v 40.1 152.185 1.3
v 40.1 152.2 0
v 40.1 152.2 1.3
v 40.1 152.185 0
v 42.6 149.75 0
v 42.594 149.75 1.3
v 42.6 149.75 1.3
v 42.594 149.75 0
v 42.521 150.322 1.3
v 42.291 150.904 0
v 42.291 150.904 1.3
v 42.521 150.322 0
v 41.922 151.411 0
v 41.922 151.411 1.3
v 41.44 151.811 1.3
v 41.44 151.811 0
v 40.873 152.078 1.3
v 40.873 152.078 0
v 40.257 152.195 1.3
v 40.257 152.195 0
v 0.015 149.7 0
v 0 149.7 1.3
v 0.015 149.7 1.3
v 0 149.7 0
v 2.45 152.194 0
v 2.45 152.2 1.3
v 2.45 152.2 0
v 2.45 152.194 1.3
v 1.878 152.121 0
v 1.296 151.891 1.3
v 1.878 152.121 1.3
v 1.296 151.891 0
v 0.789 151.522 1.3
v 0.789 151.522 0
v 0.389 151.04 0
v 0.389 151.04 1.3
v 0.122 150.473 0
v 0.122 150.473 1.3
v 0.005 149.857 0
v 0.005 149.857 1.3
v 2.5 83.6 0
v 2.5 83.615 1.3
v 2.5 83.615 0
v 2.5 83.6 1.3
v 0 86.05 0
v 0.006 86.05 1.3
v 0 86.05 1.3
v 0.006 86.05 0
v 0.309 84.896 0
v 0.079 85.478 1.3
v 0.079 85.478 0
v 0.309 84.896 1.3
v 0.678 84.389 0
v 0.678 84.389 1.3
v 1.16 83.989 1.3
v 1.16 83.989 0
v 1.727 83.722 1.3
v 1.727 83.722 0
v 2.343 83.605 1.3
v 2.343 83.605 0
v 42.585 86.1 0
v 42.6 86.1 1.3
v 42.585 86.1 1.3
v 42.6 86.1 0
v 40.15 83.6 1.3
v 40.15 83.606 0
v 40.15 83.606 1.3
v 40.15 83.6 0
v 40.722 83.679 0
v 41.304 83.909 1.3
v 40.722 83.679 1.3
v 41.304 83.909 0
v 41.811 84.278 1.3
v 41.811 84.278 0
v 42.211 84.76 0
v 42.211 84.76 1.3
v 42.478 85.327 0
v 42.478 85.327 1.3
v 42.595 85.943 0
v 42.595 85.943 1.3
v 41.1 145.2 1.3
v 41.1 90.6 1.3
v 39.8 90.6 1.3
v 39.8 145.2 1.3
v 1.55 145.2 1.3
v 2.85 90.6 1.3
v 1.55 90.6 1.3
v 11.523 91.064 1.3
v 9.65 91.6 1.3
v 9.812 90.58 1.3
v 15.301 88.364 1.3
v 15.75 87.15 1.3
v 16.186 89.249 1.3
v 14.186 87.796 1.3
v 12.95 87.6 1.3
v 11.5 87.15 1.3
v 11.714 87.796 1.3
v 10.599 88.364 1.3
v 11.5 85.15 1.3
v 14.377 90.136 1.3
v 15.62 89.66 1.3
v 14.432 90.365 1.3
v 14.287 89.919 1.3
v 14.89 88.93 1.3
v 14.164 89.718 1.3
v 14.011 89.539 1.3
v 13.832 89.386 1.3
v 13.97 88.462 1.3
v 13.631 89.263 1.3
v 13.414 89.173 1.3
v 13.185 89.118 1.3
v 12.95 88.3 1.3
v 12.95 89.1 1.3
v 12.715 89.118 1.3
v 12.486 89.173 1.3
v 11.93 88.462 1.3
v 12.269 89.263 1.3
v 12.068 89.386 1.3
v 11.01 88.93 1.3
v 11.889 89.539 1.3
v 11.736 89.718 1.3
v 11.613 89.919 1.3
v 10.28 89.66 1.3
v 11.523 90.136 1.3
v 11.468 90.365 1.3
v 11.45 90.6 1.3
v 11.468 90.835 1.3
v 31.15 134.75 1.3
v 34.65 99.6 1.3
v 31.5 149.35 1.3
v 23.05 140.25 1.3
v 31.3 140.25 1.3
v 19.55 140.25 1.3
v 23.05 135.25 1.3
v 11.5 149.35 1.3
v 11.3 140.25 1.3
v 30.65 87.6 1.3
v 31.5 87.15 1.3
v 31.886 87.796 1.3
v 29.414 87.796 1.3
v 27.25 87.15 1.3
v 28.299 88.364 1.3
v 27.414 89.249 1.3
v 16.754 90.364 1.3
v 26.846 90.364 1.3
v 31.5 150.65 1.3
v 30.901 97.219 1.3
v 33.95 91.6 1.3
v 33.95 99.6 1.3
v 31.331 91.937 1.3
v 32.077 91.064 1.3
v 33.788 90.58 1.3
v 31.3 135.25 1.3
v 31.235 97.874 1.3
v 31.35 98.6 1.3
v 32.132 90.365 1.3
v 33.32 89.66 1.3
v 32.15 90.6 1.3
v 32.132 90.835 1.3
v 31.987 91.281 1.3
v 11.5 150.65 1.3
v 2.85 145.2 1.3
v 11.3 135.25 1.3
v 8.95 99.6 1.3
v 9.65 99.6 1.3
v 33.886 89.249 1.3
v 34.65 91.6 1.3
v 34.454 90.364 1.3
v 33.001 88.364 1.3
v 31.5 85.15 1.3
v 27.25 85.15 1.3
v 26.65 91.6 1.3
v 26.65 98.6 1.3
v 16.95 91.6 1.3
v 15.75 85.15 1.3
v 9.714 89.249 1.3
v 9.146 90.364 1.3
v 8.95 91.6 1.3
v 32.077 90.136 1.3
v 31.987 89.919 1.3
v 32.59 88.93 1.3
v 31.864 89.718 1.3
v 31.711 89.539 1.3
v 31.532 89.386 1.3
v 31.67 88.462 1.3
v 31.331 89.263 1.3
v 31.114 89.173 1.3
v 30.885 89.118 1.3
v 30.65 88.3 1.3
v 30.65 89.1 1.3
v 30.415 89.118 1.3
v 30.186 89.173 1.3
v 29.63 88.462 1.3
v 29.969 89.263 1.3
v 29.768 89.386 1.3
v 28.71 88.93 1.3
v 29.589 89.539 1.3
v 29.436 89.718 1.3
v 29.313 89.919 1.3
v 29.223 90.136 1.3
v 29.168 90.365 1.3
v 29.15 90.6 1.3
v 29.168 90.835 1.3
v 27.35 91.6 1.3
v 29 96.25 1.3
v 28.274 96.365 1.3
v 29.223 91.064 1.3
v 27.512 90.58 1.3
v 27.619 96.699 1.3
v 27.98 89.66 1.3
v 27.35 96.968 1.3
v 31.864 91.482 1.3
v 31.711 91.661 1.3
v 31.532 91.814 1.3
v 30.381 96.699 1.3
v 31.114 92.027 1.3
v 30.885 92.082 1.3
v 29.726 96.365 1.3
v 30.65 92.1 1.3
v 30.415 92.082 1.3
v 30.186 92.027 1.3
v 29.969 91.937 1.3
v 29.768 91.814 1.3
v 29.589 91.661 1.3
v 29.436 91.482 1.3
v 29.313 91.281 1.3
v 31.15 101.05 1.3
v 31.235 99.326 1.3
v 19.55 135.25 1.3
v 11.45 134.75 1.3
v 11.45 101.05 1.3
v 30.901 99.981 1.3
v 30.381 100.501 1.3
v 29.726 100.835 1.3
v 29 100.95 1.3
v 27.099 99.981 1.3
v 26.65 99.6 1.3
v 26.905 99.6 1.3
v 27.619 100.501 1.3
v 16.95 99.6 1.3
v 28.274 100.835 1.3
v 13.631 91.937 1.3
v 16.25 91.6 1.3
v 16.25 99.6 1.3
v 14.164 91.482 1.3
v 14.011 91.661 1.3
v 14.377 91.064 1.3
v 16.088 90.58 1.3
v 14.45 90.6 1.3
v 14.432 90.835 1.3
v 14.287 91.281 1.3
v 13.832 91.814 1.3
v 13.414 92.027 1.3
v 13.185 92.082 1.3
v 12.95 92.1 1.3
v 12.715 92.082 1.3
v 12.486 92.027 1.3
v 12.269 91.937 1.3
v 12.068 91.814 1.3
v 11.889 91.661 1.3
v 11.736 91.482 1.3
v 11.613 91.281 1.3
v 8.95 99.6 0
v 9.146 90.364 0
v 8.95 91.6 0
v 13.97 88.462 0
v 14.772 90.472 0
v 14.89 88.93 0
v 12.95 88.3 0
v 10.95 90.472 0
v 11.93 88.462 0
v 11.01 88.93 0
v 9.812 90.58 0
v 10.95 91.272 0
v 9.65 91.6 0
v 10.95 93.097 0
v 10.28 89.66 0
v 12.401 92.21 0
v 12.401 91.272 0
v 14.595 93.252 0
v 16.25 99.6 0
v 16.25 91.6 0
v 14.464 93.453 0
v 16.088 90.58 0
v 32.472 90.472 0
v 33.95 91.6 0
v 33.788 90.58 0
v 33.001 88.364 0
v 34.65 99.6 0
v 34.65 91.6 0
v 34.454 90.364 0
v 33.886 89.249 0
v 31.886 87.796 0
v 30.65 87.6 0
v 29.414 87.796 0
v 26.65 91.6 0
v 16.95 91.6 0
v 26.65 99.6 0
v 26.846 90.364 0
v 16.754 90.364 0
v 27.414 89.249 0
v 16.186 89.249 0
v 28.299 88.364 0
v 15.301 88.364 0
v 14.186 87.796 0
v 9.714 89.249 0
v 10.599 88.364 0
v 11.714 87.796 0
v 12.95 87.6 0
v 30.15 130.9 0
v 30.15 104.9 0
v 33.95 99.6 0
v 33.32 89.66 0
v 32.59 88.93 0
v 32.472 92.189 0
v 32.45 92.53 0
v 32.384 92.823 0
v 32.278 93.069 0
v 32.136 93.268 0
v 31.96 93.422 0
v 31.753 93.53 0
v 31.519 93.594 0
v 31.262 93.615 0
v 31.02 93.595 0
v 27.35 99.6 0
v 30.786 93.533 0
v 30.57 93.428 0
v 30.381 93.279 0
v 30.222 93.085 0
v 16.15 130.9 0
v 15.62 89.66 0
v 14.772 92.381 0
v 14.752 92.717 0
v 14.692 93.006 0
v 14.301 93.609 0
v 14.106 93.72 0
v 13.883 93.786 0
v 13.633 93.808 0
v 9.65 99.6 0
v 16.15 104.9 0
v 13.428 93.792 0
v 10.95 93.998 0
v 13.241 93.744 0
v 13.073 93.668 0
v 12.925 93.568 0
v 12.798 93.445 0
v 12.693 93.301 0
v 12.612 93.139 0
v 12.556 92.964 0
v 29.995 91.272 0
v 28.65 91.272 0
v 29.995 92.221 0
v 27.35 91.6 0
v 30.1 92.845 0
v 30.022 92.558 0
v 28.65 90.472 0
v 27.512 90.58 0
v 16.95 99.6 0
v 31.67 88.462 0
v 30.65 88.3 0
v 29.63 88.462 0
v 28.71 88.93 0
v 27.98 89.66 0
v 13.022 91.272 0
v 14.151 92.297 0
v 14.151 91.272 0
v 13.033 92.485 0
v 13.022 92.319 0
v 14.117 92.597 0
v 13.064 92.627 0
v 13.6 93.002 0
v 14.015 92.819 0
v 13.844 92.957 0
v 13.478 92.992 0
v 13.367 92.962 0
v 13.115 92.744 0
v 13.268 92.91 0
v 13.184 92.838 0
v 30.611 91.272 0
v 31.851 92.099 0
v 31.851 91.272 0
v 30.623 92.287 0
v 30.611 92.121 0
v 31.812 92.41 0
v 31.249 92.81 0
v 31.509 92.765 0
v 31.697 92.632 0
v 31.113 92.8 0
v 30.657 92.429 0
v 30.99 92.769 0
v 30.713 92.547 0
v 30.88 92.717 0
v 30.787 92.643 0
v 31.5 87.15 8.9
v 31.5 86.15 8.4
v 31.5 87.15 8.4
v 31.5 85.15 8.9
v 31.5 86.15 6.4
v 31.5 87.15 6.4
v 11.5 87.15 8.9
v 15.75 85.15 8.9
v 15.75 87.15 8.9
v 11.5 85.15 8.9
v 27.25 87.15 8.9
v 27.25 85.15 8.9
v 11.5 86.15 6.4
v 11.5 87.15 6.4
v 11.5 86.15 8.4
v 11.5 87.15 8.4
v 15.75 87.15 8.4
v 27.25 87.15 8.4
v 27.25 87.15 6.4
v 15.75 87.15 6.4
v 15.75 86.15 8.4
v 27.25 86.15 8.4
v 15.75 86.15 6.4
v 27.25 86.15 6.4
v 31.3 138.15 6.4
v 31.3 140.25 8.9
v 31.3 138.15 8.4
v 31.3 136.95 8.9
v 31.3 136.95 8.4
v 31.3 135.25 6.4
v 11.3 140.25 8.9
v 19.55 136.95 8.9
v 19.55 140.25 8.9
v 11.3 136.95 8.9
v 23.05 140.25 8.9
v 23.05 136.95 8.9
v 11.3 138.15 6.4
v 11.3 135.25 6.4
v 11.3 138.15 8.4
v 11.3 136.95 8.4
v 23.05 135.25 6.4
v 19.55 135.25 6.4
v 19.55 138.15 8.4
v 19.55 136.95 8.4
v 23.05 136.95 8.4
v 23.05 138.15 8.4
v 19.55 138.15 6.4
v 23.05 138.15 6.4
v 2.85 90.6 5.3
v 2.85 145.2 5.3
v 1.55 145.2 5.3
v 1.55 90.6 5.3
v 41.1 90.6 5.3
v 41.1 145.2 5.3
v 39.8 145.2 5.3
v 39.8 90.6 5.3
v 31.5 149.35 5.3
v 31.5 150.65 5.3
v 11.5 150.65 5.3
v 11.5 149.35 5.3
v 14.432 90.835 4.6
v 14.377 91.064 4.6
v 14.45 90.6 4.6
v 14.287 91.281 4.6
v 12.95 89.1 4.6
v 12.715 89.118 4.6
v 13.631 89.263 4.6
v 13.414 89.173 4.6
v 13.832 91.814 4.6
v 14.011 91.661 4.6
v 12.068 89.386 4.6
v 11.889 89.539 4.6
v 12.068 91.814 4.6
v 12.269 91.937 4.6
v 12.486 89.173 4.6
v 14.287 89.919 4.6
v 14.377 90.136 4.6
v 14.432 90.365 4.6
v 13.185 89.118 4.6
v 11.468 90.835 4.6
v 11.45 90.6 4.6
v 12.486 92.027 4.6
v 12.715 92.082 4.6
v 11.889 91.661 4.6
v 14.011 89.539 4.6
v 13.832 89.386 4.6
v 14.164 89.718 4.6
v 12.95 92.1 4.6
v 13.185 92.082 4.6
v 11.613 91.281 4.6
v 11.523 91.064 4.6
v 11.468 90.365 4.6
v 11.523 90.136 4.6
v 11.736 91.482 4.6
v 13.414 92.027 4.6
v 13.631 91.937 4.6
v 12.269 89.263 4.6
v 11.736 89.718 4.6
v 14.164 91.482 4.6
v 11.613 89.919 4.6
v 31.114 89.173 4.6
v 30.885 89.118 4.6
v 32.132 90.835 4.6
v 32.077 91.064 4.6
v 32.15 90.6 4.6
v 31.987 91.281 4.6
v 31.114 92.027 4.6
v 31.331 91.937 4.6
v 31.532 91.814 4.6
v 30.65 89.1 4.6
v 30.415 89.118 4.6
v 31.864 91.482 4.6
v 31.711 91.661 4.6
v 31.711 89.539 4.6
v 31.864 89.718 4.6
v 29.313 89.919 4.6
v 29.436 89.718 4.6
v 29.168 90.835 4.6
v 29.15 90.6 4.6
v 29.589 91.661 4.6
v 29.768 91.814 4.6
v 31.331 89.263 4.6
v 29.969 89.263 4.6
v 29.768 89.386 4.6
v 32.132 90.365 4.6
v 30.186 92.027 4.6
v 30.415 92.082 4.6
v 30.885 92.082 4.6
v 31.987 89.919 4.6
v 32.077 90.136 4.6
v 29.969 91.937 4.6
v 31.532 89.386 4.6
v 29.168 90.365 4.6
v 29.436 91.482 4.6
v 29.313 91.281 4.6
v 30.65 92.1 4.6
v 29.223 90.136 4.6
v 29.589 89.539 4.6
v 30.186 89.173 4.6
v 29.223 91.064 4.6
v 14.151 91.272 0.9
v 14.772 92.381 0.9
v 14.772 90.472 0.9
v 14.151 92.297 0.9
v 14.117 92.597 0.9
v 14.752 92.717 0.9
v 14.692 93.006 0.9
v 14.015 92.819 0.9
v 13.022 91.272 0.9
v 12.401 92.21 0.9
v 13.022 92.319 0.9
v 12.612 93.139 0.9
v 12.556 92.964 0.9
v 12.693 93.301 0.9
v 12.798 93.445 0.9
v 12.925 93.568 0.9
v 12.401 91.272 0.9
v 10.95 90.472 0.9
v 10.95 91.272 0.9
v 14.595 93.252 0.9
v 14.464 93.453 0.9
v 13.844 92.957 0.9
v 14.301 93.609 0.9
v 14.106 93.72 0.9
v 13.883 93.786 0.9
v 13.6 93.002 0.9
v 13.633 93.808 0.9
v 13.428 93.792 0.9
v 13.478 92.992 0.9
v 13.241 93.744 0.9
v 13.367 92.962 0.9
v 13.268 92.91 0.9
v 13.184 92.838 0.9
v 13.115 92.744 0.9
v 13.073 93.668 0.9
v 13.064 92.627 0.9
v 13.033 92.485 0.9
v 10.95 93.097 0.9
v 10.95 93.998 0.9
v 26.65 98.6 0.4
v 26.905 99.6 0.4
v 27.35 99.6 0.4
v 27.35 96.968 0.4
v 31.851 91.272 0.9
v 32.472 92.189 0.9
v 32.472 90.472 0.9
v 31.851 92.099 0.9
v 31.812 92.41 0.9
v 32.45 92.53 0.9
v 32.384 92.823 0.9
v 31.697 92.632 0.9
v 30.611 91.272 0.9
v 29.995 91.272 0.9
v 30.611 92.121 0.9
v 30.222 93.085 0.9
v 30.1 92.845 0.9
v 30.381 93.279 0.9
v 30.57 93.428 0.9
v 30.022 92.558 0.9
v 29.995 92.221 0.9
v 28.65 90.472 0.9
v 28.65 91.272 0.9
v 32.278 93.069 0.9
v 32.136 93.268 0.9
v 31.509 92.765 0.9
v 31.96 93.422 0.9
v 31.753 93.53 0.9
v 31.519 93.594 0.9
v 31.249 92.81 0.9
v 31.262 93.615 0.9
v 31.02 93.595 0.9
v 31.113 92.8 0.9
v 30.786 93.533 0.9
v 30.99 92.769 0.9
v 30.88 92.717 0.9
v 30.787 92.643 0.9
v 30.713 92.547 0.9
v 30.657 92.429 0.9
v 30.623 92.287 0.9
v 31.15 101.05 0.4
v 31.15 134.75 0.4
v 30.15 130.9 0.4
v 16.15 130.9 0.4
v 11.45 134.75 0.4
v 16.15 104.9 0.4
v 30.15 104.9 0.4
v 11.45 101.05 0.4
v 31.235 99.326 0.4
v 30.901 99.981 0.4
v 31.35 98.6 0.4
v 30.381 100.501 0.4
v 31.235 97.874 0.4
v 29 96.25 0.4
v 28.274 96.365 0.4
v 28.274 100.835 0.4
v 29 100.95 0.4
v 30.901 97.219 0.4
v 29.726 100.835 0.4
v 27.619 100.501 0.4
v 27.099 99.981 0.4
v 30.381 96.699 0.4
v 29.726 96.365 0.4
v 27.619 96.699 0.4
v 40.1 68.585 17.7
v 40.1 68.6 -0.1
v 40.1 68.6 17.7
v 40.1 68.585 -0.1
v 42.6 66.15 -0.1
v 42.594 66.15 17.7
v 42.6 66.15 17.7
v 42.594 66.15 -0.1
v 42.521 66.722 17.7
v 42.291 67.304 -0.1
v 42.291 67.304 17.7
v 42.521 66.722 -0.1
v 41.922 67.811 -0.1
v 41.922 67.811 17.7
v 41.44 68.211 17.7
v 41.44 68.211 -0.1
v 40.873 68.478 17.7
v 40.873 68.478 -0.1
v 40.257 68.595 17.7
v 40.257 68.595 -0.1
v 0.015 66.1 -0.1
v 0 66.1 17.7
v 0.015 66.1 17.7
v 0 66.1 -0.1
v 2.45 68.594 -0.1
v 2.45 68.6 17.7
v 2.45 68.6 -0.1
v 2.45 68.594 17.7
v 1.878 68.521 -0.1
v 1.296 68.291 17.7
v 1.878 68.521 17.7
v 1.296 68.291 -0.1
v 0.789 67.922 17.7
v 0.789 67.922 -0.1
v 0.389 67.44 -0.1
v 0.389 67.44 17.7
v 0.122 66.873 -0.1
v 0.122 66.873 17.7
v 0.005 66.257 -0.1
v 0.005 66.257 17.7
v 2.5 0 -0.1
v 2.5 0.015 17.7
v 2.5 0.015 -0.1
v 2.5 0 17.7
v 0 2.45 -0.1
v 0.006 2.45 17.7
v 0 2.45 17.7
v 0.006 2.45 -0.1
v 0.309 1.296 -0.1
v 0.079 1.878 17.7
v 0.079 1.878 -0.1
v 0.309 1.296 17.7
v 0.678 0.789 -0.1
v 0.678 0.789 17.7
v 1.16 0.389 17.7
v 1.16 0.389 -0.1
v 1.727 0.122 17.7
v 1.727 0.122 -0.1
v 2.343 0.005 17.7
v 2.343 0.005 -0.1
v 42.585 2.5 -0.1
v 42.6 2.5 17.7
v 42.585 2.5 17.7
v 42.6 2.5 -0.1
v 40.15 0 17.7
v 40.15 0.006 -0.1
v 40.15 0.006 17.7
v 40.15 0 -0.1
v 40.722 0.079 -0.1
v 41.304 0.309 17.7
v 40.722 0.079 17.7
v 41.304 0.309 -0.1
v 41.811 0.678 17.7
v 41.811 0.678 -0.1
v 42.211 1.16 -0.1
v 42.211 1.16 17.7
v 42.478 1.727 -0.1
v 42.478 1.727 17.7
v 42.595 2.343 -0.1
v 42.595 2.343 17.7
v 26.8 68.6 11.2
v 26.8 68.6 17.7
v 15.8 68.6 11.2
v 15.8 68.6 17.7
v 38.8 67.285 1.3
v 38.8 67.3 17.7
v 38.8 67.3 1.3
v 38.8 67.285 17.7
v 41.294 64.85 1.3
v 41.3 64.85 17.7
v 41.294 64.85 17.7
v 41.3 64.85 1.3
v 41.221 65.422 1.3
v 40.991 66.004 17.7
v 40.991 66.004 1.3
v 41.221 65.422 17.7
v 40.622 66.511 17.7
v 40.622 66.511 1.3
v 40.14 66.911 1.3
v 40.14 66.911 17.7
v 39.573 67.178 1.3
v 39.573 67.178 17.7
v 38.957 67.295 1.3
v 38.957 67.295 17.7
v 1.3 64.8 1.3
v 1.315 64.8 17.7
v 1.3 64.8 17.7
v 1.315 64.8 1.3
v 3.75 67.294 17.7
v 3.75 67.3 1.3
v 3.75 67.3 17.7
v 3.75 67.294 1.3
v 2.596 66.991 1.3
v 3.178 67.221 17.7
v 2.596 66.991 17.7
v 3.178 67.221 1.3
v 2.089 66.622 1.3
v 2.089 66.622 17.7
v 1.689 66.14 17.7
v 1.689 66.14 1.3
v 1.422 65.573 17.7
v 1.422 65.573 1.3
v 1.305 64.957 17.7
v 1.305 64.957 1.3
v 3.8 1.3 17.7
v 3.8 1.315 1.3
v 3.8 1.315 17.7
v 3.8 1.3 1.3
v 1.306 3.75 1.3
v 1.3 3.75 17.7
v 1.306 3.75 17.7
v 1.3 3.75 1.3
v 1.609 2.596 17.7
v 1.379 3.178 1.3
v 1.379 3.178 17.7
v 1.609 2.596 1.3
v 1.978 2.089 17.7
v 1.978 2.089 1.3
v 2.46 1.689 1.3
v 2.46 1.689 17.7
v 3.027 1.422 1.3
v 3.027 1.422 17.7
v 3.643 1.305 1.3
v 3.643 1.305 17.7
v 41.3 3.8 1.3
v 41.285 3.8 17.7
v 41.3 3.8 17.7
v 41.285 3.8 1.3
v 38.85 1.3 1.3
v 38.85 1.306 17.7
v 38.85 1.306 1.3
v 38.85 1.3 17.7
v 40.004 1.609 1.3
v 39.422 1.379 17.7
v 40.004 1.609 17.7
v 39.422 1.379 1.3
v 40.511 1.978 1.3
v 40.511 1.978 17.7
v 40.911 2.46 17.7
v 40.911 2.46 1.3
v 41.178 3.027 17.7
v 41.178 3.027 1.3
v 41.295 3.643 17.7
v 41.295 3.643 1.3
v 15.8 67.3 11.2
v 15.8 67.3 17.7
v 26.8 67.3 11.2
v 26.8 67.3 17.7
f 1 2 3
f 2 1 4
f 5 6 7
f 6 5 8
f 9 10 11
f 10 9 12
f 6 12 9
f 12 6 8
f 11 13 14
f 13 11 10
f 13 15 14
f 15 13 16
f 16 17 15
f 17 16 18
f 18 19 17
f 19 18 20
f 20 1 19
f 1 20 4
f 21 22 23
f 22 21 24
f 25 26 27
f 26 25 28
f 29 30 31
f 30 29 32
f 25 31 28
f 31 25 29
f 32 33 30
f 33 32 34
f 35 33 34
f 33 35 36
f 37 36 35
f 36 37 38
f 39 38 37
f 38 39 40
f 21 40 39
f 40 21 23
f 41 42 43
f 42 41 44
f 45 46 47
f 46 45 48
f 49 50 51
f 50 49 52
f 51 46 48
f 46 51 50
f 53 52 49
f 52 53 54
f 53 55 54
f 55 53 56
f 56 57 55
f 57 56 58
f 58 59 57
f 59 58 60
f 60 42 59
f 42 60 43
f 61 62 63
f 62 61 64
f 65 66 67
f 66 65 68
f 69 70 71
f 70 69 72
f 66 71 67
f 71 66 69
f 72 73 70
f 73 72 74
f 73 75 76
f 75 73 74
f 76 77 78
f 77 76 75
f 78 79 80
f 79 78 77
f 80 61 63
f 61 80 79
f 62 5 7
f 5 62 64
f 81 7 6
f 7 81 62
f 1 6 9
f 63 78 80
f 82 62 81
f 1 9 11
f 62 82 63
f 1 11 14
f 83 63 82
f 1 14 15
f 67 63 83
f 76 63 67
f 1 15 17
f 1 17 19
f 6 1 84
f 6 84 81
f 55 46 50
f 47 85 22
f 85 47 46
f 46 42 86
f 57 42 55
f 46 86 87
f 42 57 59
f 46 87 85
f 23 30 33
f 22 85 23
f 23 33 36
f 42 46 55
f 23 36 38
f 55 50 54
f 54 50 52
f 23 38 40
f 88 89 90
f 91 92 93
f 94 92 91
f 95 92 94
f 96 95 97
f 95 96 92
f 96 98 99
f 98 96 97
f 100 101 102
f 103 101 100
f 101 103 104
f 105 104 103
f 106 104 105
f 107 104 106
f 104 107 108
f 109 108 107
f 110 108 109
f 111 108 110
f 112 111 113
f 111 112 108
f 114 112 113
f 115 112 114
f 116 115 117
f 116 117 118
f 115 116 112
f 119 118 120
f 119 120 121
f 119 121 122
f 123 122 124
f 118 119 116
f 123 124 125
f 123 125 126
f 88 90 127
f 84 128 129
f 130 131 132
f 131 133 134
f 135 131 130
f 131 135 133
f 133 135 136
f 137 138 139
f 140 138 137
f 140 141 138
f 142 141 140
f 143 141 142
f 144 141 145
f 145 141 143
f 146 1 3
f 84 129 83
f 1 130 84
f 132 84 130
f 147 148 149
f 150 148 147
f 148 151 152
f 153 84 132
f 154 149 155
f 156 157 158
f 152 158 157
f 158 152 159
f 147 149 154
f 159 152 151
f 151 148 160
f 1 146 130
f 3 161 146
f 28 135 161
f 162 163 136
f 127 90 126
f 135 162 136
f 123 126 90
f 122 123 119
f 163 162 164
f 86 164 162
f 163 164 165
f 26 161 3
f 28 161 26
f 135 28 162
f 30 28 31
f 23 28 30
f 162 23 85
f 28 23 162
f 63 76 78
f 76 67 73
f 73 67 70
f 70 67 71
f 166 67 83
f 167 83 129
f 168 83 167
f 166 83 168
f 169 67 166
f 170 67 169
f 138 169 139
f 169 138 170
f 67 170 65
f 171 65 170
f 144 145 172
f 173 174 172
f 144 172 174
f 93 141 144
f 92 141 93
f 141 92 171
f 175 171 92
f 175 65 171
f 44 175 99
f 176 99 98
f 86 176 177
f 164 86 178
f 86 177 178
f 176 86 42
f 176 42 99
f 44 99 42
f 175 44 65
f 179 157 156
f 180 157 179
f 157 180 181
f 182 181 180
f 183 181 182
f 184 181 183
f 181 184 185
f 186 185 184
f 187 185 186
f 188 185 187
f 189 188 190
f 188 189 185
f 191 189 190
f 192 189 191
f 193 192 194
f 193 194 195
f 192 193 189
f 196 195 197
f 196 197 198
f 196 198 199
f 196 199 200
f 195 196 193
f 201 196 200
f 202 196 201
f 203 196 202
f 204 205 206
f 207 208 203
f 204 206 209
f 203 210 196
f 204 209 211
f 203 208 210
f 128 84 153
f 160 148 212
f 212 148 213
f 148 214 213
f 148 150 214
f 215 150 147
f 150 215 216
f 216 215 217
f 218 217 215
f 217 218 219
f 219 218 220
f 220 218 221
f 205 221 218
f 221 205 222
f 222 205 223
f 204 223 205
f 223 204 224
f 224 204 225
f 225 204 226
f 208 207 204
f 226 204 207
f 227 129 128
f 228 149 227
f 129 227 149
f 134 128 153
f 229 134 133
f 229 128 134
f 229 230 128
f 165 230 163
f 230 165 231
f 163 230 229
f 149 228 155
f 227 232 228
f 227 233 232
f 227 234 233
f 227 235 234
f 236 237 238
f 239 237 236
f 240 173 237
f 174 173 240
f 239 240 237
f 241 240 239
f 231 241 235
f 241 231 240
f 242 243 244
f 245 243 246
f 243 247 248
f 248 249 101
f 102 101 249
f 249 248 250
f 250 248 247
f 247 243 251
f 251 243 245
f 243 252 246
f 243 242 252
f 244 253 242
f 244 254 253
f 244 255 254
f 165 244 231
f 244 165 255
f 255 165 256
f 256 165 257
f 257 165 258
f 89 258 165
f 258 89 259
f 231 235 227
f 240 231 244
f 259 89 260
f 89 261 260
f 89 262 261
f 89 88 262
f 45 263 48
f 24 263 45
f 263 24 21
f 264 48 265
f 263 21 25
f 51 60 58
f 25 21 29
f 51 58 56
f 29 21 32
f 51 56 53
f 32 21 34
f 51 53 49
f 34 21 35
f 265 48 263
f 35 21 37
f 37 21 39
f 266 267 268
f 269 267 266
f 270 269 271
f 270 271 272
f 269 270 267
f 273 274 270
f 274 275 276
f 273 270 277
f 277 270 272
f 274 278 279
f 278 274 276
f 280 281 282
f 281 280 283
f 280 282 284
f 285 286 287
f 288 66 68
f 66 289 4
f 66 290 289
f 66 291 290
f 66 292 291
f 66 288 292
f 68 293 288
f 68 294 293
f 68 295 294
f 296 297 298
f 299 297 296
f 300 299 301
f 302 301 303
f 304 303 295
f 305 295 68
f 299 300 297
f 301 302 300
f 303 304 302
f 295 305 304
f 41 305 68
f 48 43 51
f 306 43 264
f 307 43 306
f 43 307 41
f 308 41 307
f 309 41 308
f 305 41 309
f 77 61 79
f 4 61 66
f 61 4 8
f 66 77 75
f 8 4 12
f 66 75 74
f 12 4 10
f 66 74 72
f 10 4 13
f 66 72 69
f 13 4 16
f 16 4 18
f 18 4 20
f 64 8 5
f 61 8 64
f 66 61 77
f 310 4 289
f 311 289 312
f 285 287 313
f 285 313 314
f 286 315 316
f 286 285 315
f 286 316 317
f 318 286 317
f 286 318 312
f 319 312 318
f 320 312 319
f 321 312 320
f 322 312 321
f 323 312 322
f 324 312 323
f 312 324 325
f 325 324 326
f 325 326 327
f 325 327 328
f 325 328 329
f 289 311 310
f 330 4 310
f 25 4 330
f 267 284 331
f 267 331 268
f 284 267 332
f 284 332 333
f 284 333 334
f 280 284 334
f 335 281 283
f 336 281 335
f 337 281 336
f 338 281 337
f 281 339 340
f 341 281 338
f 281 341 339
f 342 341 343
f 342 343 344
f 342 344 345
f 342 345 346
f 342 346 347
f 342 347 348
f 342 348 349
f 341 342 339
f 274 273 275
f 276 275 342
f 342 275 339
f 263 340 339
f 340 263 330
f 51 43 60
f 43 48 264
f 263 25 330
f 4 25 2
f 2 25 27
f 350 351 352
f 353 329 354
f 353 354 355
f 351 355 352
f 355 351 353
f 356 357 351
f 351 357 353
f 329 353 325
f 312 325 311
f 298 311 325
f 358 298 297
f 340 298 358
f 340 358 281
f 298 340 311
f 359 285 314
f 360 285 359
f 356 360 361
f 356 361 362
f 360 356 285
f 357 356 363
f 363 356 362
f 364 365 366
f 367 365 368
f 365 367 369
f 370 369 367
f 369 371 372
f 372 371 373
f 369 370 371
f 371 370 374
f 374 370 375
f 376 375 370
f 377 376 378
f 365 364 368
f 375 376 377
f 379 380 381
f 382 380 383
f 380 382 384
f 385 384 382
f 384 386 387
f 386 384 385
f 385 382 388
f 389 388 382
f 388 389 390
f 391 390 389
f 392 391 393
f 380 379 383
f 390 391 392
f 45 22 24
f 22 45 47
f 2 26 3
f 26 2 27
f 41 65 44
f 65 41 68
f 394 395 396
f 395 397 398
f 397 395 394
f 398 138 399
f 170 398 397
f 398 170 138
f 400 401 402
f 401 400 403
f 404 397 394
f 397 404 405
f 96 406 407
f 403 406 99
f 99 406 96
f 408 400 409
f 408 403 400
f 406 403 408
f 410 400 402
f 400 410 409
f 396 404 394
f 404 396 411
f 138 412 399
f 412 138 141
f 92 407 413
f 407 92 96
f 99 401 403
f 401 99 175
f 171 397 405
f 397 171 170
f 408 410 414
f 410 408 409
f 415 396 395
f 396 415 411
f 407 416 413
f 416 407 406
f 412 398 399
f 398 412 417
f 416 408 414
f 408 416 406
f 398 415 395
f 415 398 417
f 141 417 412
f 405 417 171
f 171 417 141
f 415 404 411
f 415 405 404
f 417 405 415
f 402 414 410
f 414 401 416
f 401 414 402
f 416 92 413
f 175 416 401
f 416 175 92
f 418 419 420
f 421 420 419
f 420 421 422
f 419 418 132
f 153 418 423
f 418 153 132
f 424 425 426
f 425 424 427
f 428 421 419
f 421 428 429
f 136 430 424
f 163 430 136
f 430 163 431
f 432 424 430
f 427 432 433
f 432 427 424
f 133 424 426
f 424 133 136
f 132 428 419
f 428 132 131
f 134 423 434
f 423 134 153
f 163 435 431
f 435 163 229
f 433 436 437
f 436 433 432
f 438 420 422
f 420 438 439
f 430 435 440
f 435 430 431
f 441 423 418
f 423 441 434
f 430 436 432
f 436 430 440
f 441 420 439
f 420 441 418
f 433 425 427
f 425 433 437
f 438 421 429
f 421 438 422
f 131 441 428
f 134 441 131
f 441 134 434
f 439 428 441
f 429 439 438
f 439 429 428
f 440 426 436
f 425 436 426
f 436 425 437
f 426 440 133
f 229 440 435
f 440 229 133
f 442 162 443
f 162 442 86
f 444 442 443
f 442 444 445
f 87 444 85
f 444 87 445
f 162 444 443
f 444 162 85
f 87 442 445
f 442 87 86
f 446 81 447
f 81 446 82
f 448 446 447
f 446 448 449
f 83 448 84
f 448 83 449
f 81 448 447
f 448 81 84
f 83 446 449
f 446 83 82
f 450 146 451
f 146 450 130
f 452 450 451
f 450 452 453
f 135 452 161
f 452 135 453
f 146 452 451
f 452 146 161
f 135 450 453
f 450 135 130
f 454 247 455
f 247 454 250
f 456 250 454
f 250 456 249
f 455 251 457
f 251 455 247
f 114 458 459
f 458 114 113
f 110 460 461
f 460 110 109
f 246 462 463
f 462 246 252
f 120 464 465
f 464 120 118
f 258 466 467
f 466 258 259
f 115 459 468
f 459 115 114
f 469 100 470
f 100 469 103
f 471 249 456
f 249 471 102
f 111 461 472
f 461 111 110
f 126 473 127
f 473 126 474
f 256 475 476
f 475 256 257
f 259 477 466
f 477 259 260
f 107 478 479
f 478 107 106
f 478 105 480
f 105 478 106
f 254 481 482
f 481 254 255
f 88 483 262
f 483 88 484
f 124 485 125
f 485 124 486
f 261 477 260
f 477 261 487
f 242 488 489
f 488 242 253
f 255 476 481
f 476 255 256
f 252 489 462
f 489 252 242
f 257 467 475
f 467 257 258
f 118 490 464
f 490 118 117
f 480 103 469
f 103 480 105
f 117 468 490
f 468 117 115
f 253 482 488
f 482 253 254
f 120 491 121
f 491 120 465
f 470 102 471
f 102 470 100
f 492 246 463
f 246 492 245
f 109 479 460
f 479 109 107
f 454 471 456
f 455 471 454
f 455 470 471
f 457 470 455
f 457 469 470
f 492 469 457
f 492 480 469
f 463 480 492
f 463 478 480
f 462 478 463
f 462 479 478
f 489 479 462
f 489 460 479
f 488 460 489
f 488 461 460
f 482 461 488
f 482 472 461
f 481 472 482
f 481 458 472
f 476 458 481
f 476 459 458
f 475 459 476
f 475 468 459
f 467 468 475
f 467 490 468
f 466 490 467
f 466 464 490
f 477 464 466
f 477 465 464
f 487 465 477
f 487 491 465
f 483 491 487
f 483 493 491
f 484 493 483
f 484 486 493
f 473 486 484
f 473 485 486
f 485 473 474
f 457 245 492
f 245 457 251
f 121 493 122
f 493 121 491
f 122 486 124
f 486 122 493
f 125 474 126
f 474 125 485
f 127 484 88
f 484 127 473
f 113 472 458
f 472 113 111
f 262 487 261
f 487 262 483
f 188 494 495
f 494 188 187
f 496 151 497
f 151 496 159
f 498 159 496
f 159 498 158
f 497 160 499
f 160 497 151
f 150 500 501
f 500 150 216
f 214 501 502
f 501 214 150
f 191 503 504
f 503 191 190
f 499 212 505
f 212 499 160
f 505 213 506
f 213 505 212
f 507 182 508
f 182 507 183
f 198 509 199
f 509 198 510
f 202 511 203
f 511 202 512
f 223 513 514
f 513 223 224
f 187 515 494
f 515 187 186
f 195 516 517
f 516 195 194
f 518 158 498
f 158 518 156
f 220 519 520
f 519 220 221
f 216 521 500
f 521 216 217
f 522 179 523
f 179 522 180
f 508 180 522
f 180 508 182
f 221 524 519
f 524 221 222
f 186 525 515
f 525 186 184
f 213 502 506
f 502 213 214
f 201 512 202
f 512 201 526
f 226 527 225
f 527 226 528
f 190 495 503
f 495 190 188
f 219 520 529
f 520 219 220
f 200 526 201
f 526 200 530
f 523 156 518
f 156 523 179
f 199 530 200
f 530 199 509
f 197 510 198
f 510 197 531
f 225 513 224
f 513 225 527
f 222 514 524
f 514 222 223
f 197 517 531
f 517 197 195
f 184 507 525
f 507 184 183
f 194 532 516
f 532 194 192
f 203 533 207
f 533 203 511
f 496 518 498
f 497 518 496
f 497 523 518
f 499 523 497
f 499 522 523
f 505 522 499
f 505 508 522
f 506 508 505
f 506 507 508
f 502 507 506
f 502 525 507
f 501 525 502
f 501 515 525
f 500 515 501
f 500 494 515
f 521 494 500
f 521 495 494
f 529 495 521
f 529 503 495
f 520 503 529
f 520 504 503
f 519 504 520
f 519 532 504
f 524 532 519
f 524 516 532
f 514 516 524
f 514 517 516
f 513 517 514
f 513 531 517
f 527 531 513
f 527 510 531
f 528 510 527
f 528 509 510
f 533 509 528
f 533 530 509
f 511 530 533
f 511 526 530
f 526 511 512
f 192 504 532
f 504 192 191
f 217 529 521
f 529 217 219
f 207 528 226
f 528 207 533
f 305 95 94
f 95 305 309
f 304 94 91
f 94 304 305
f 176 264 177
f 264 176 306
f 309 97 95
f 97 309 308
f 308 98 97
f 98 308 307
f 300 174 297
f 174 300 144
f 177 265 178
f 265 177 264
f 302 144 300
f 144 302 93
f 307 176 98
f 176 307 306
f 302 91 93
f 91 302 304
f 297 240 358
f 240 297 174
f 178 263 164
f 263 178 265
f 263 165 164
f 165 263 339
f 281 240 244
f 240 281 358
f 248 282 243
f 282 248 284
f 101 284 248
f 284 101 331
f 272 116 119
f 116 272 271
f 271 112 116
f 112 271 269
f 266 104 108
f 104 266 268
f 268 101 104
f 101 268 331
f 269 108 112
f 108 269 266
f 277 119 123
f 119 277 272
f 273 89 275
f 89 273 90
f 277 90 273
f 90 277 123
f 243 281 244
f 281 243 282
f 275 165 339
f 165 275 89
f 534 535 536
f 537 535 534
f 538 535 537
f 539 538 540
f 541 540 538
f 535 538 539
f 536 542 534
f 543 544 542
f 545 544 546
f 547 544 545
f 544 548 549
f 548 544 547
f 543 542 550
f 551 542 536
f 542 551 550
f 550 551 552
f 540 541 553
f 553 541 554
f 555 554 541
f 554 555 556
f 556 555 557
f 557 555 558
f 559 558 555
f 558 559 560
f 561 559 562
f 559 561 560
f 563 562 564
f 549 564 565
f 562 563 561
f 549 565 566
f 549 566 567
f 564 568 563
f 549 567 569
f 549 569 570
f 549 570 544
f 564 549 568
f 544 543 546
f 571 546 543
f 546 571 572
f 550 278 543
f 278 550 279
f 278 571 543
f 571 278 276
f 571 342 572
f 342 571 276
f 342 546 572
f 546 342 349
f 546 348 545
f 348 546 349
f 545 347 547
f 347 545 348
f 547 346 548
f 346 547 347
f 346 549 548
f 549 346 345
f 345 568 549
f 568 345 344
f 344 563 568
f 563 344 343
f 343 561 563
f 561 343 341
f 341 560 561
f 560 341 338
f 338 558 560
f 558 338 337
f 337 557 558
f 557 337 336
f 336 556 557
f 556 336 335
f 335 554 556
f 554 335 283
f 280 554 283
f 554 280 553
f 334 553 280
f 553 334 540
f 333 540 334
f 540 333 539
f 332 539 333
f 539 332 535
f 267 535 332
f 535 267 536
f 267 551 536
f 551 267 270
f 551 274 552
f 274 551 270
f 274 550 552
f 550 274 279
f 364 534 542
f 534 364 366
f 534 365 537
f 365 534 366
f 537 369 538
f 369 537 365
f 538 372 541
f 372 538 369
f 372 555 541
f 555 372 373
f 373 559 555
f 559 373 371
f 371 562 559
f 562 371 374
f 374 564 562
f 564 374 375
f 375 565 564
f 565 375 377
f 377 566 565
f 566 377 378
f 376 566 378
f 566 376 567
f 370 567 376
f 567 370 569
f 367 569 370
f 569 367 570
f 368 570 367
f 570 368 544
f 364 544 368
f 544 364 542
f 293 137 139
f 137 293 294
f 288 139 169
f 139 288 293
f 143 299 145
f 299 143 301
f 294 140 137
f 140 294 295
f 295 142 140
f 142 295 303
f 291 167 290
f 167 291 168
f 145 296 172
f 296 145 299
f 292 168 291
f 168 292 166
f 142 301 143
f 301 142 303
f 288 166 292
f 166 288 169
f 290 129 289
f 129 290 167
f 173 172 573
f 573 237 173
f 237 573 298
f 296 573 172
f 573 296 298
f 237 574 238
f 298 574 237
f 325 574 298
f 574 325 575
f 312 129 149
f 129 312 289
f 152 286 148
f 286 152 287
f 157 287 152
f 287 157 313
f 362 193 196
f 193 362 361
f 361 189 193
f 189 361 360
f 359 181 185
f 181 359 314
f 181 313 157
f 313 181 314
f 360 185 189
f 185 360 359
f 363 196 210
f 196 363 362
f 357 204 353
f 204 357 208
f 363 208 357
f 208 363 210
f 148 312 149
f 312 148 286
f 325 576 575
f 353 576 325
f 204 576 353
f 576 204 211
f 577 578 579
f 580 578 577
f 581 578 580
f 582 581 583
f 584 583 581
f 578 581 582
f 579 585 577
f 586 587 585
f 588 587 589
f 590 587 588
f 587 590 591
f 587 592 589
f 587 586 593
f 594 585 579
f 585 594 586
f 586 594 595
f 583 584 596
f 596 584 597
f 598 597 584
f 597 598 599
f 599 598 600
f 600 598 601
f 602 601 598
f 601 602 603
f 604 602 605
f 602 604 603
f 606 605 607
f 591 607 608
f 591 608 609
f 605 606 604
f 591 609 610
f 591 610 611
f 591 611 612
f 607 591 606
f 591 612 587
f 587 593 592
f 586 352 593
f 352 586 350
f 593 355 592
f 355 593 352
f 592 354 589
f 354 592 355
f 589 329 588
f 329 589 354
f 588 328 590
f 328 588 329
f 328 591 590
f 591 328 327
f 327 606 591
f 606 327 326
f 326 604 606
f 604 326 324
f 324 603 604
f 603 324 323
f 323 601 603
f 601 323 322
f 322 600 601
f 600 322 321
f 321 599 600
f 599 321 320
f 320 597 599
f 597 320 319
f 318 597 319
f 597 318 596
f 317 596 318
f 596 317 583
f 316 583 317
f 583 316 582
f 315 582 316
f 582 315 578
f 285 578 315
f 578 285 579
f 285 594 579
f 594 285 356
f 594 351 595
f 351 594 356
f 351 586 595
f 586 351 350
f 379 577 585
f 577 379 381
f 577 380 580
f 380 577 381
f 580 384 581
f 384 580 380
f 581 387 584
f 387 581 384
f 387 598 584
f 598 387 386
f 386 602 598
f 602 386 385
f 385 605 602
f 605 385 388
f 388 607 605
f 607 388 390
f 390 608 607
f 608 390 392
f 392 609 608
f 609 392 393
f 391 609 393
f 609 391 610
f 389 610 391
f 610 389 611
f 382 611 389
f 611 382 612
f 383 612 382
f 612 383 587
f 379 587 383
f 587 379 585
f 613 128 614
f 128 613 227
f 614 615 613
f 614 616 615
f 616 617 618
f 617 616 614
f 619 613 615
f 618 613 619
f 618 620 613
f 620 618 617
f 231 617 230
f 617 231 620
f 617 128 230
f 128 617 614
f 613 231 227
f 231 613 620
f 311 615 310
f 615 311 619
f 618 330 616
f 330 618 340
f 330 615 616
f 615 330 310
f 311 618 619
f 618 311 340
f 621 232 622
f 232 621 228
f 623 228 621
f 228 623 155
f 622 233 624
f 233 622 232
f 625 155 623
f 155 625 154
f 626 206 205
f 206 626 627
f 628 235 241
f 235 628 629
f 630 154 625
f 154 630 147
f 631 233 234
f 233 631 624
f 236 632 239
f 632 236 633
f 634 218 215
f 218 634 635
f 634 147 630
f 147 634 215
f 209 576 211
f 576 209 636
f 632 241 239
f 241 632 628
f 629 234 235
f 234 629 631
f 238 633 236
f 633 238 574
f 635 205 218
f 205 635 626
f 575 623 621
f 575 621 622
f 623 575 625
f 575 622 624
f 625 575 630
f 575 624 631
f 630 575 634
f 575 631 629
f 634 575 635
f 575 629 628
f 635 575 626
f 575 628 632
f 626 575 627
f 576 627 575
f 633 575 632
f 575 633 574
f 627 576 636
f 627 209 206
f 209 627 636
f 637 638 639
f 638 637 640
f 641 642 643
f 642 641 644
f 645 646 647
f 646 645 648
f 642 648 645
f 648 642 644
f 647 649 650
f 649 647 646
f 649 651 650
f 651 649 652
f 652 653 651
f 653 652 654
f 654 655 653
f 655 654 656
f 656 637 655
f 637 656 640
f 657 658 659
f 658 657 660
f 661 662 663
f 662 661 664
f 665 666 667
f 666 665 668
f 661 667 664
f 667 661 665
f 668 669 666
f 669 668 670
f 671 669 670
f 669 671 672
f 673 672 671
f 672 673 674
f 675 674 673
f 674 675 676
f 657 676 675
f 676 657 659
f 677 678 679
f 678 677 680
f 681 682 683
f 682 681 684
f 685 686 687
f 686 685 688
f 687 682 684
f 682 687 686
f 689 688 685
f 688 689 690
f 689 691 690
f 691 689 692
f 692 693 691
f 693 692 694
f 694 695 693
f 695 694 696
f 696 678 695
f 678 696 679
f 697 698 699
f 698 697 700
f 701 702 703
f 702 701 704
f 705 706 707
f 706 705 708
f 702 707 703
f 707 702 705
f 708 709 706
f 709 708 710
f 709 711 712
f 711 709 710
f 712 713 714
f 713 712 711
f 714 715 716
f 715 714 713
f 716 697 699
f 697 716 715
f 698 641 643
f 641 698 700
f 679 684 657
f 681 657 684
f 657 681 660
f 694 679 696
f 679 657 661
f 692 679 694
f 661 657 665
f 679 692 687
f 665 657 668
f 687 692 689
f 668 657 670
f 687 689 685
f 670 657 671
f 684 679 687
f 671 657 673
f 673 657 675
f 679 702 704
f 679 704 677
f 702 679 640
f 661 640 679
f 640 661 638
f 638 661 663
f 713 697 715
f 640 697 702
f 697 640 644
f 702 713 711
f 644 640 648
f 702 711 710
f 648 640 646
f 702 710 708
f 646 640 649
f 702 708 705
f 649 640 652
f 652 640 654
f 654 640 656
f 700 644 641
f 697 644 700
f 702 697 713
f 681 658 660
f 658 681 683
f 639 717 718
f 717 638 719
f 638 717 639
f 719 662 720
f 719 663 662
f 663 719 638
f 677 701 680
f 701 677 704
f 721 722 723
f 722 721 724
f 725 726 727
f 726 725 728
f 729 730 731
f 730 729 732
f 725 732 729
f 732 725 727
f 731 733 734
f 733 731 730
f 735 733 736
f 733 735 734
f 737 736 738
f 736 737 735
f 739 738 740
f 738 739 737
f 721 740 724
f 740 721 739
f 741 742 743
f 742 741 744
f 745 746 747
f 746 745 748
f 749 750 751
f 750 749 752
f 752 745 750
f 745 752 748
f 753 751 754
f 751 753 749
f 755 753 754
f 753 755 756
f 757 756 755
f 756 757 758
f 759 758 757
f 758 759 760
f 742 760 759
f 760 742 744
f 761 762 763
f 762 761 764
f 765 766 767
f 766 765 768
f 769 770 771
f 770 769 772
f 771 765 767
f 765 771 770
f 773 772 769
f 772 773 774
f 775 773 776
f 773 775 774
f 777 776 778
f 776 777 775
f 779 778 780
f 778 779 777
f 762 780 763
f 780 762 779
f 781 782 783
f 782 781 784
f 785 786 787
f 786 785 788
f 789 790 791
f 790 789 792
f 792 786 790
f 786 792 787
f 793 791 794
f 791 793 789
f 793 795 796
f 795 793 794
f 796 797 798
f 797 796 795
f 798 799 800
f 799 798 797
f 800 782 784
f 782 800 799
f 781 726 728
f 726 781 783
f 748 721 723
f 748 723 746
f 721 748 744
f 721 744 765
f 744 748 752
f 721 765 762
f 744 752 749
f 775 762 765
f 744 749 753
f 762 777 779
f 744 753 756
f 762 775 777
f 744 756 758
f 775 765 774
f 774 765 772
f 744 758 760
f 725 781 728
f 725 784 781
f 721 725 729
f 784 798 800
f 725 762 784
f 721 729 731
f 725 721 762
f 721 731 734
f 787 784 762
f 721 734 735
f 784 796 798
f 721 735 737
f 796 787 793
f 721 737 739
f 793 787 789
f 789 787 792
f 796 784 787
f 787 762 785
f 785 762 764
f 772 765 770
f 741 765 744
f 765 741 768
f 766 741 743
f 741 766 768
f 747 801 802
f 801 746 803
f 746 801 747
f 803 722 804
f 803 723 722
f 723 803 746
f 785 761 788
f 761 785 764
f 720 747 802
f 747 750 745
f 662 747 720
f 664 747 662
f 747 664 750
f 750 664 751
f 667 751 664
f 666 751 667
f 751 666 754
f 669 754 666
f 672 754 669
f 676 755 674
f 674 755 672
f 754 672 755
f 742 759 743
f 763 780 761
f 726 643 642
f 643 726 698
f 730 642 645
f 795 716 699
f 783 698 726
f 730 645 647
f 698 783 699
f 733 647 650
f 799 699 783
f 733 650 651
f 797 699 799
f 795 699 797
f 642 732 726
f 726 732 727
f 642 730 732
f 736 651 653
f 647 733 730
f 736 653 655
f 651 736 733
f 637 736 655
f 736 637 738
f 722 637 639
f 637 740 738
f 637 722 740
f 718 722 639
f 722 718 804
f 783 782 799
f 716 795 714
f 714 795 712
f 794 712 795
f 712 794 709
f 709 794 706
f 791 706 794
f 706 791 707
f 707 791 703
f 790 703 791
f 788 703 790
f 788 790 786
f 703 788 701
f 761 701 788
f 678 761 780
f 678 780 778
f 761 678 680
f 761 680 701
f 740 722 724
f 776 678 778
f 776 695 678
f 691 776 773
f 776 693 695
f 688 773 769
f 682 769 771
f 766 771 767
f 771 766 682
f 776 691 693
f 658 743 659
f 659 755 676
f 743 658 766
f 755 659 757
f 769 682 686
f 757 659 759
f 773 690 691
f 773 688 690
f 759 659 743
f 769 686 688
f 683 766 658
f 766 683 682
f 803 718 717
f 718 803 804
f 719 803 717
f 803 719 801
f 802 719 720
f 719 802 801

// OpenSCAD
// file: roundCornersCube.scad
/*
http://codeviewer.org/view/code:1b36 
Copyright (C) 2011 Sergio Vilches
This program is free software: you can redistribute it and/or modify it under the terms of the GNU General Public License as published by the Free Software Foundation, either version 3 of the License, or (at your option) any later version.
This program is distributed in the hope that it will be useful, but WITHOUT ANY WARRANTY; without even the implied warranty of MERCHANTABILITY or FITNESS FOR A PARTICULAR PURPOSE. See the GNU General Public License for more details. You should have received a copy of the GNU General Public License along with this program. If not, see <http://www.gnu.org/licenses/>.
Contact: s.vilches.e@gmail.com


    ----------------------------------------------------------- 
                 Round Corners Cube (Extruded)                
      roundCornersCube(x,y,z,r) Where:                        
         - x = Xdir width                                     
         - y = Ydir width                                     
         - z = Height of the cube                             
         - r = Rounding radious                               
                                                              
      Example: roundCornerCube(10,10,2,1);                    
     *Some times it's needed to use F6 to see good results!   
 	 ----------------------------------------------------------- 
*/
// Test it!
//roundCornersCube(10,5,2,1);


module createMeniscus(h,radius) // This module creates the shape that needs to be substracted from a cube to make its corners rounded.
difference(){        //This shape is basicly the difference between a quarter of cylinder and a cube
   translate([radius/2+0.1,radius/2+0.1,0]){
      cube([radius+0.2,radius+0.1,h+0.2],center=true);         // All that 0.x numbers are to avoid "ghost boundaries" when substracting
   }

   cylinder(h=h+0.2,r=radius,$fn = 25,center=true);
}


module roundCornersCube(x,y,z,r)  // Now we just substract the shape we have created in the four corners
difference(){
   cube([x,y,z], center=true);

translate([x/2-r,y/2-r]){  // We move to the first corner (x,y)
      rotate(0){  
         createMeniscus(z,r); // And substract the meniscus
      }
   }
   translate([-x/2+r,y/2-r]){ // To the second corner (-x,y)
      rotate(90){
         createMeniscus(z,r); // But this time we have to rotate the meniscus 90 deg
      }
   }
      translate([-x/2+r,-y/2+r]){ // ... 
      rotate(180){
         createMeniscus(z,r);
      }
   }
      translate([x/2-r,-y/2+r]){
      rotate(270){
         createMeniscus(z,r);
      }
   }
}
// main file
// by Klaus Kloos V1.0 171126
// www.klkl.de
//
use <roundCornersCube.scad>

// was soll angezeigt werden?
showLid = true;                 // der Deckel
showBox = true;                // die Kiste
showESP = false;                // mit Platine an der Einbauposition
showComplete = false;           // mit Deckel, ergibt Aussenansicht
// the two switches
showHolesForSwitches = false;   // zur Bedienung mit etwas langem duennen
showSwitches = true;            // Tasten im Gehaese

// Konfiguration
mitUSBLoch = true;

// die Platine
pcbY = 65;                  // wenn das Display mittig ist, eigentlich 48
pcbX = 37;                  // ... 26 ist die richtige Breite 
pcbZ = 1.8;                 // die Dicke der Platine
antenneD = 4.7;             // die Bohrung fuer die Antenne

sz = 19;                    // die äußere Hoehe des Kastens, ohne Batterie
//sz = 30;                  // mit unterhalb liegender Batterie 
wall_thickness = 1.3;	    // thickness of the walls of the box (and lid)
lipHeight = 4;	            // the sides of the lid holding it in the box			

plugAddX = 2;               // was kommt durch den Stecker in x-Richtung dazu

dispX = 19+.7;              // die Vertiefung im Deckel
dispY = 33+.7;              // ...
dispZ = 6+.7;               // ...
visX = 14;                  // die sichtbare Fläche des Displays
visY = 26;                  // ...

// wo liegt die Platine
distPCBouterSideX = wall_thickness+.5;	// die Platine liegt an den Aussenwänden an
distPCBouterSideY = wall_thickness+.5;	// der zusaetzliche Abstand kommt durch die runden Ecken

// case details (these are *outer* diameters of the case) 
sx = pcbX + 2*distPCBouterSideX+plugAddX; 	// X dimension
sy = pcbY + 2*distPCBouterSideY;	        // Y dimension
r = 2.5;							        // the radius of the curves of the box walls.

module polyhole(h, d) 
{
	/* Nophead's polyhole code */
    n = max(round(2 * d),3);
    rotate([0,0,180])
        cylinder(h = h, r = (d / 2) / cos (180 / n), $fn = n);
}

module esp32(){
    pinH = 8;   // die Höhe der Pins
    union(){
        cube([1,pcbY,pinH]);                            // Pins1
        translate([pcbX-1,0,0]) cube([1,pcbY,pinH]);    // Pins2
        translate([0,0,pinH]) cube([pcbX,pcbY,pcbZ]);   // Platine
        
        translate([4,0,pinH+1]){                        // der Plastikaufbau ist nicht mittig
            cube([dispX,dispY,dispZ]);                  // das Diplay
            color ("black") translate([4,4,dispZ])cube([visX,visY,.3]); // der sichtbare Teil
        }
    }
}

module generateLid () {
    corner_lip_dia = 3.5;
    rahmenZ = .4;           // die Abdeckung um das Display herum, auch über der runden Antenne
    
    translate([0, sy+15, 0])
    difference(){
        union(){
            //Create the lid
            dL = .25;                   // ein Fummelfaktor für die Deckelpassung
            pcbZdist = 6.0;             // der Abstand der Platine von der Blende
            snapHeight = pcbZdist+2.5;  // Hoehe des Befestigungs-Clips
            pcbZplus = pcbZ+.2;         // mit Platz fuer die Platine
            translate([sx/2, sy/2, wall_thickness/2]) roundCornersCube(sx,sy,wall_thickness,r);
            //der Halter am Stecker
            translate([0,0,rahmenZ]){   //das Display liegt auf dem Deckel auf
                translate([corner_lip_dia+8,wall_thickness+dL, 0]) difference(){
                    cube([20,2,snapHeight]);
                    translate([-.1,1,pcbZdist]) cube([20.2,2,pcbZplus]); // Nut fuer Platine
                    halterX = 11.5;   // die Luecke für den USB Stecker
                    translate([(20-halterX)/2,-.1,0]) cube([halterX,10,10]);
                }
                // der Halter auf der anderen Seite
                translate([(sx-20)/2,(sy-dispY)/2+dispY+.5,0]) difference(){
                    cube([20,5,snapHeight]);
                    translate([-.1,-.1,pcbZdist]) cube([20.2,3,pcbZplus]); // Nut fuer Platine
                    translate([-.1,-.1,pcbZdist+pcbZ-.1]) cube([20.2,3.3-1.5,4]); // ueber Platine
                    halterLuecke = 3.5;   // hier sitzt die Antenne
                    translate([(20-halterLuecke)/2,-.1,0]) cube([halterLuecke,10,10]);
                }
            }
            // die Verstaerkungen an der Seite mit Auflage
            translate([wall_thickness+dL,corner_lip_dia*2,wall_thickness])
                        cube([wall_thickness,sy-corner_lip_dia*4,lipHeight]);
            translate([sx - wall_thickness*2-.2,corner_lip_dia*2, wall_thickness])
                        cube([wall_thickness,sy-corner_lip_dia*4,lipHeight]);
            translate([corner_lip_dia+8,sy - wall_thickness*2-dL,wall_thickness])
                cube([20,wall_thickness,lipHeight]);
            translate([(sx-dispX)/2+1.5,6,-.1]) switchPin();
            translate([(sx+dispX)/2-.5,6,-.1]) switchPin();
        }
        // and the holes
        translate([(sx-dispX)/2,(sy-dispY)/2,+rahmenZ]) cube([dispX, dispY, 5]);        // Display Vertiefung
        translate([sx/2+dispX/2-visX-1,(sy-visY)/2,-.1]) cube([visX, visY, 5]);           // Display Rahmen
        translate([29,15,rahmenZ]) cylinder(d=antenneD, h=wall_thickness+.2, $fn=20);   // Antenne
        if(showHolesForSwitches || showSwitches){
            translate([(sx-dispX)/2+1.5,6,-.1]) switchOutline("R");
            translate([(sx+dispX)/2-.5,6,-.1]) switchOutline("P");
        }
    }
}


module switchPin(){
    translate([0,1,wall_thickness-.2]) cylinder(h=4.9-wall_thickness, d=3, $fn=40);
}


module switchOutline(zeichen){ // wird für die Taster abgezogen
    if(showHolesForSwitches){
        cylinder(d=2.5, h=wall_thickness+.2, $fn=20);
    }
    if(showSwitches){
        difference(){
            z = wall_thickness+.2;
            knopf=8;
            union(){    // aussen, kommt weg
                translate([0,2,0]) cylinder(d=knopf, h=z, $fn=20);
                translate([-4,2,0]) cube([knopf, 8, z]);
            }
            // innen, bleibt stehen
            s=.7;   // der Spalt am Knopf .5 war zu wenig
            innen = knopf-2*s;
            translate([0,2,0]) cylinder(d=innen, h=wall_thickness+.2, $fn=20);
            translate([-innen/2,2,0]) cube([innen, 9, z]);
        }
        einpressTiefe = 1;
        fontHeight = 4;
        rotate([180,0,90]) translate([.5,-fontHeight/2,-einpressTiefe]) linear_extrude(2)
            text(zeichen, font = "Liberation Sans:style=Bold", fontHeight, halign = "left");
    }
}


module generateBox(){
    plugZ = 11;
    plugY = 15;
    plugX = 11;
    difference() {
        // the outer box
        translate([sx/2, sy/2, sz/2-.1 ]) roundCornersCube(sx,sy,sz, r);
        //cut off the 'lid' of the box
        translate([-0.1,-0.1, sz - wall_thickness]) cube([sx+1,sy+1,wall_thickness + 1]);
        //hollow it out
        innenY = sy - (wall_thickness*2);
        translate([sx/2, sy/2, sz/2 + wall_thickness])
            roundCornersCube(sx - (wall_thickness*2) , innenY , sz, r);
        if(mitUSBLoch){
            translate([(sx-plugX)/2, sy-10, sz-wall_thickness-6.5])
                cube([plugX, plugY, plugZ]);
        }
    }
}

if(showLid){
    generateLid();
}
if(showBox){
    generateBox();
}
if(showComplete){
    translate([sx/2, sy/2, sz-.5]) roundCornersCube(sx,sy,wall_thickness,r); 
}
if(showESP){
    translate([distPCBouterSideX,distPCBouterSideY,sz-12]) esp32();
}
